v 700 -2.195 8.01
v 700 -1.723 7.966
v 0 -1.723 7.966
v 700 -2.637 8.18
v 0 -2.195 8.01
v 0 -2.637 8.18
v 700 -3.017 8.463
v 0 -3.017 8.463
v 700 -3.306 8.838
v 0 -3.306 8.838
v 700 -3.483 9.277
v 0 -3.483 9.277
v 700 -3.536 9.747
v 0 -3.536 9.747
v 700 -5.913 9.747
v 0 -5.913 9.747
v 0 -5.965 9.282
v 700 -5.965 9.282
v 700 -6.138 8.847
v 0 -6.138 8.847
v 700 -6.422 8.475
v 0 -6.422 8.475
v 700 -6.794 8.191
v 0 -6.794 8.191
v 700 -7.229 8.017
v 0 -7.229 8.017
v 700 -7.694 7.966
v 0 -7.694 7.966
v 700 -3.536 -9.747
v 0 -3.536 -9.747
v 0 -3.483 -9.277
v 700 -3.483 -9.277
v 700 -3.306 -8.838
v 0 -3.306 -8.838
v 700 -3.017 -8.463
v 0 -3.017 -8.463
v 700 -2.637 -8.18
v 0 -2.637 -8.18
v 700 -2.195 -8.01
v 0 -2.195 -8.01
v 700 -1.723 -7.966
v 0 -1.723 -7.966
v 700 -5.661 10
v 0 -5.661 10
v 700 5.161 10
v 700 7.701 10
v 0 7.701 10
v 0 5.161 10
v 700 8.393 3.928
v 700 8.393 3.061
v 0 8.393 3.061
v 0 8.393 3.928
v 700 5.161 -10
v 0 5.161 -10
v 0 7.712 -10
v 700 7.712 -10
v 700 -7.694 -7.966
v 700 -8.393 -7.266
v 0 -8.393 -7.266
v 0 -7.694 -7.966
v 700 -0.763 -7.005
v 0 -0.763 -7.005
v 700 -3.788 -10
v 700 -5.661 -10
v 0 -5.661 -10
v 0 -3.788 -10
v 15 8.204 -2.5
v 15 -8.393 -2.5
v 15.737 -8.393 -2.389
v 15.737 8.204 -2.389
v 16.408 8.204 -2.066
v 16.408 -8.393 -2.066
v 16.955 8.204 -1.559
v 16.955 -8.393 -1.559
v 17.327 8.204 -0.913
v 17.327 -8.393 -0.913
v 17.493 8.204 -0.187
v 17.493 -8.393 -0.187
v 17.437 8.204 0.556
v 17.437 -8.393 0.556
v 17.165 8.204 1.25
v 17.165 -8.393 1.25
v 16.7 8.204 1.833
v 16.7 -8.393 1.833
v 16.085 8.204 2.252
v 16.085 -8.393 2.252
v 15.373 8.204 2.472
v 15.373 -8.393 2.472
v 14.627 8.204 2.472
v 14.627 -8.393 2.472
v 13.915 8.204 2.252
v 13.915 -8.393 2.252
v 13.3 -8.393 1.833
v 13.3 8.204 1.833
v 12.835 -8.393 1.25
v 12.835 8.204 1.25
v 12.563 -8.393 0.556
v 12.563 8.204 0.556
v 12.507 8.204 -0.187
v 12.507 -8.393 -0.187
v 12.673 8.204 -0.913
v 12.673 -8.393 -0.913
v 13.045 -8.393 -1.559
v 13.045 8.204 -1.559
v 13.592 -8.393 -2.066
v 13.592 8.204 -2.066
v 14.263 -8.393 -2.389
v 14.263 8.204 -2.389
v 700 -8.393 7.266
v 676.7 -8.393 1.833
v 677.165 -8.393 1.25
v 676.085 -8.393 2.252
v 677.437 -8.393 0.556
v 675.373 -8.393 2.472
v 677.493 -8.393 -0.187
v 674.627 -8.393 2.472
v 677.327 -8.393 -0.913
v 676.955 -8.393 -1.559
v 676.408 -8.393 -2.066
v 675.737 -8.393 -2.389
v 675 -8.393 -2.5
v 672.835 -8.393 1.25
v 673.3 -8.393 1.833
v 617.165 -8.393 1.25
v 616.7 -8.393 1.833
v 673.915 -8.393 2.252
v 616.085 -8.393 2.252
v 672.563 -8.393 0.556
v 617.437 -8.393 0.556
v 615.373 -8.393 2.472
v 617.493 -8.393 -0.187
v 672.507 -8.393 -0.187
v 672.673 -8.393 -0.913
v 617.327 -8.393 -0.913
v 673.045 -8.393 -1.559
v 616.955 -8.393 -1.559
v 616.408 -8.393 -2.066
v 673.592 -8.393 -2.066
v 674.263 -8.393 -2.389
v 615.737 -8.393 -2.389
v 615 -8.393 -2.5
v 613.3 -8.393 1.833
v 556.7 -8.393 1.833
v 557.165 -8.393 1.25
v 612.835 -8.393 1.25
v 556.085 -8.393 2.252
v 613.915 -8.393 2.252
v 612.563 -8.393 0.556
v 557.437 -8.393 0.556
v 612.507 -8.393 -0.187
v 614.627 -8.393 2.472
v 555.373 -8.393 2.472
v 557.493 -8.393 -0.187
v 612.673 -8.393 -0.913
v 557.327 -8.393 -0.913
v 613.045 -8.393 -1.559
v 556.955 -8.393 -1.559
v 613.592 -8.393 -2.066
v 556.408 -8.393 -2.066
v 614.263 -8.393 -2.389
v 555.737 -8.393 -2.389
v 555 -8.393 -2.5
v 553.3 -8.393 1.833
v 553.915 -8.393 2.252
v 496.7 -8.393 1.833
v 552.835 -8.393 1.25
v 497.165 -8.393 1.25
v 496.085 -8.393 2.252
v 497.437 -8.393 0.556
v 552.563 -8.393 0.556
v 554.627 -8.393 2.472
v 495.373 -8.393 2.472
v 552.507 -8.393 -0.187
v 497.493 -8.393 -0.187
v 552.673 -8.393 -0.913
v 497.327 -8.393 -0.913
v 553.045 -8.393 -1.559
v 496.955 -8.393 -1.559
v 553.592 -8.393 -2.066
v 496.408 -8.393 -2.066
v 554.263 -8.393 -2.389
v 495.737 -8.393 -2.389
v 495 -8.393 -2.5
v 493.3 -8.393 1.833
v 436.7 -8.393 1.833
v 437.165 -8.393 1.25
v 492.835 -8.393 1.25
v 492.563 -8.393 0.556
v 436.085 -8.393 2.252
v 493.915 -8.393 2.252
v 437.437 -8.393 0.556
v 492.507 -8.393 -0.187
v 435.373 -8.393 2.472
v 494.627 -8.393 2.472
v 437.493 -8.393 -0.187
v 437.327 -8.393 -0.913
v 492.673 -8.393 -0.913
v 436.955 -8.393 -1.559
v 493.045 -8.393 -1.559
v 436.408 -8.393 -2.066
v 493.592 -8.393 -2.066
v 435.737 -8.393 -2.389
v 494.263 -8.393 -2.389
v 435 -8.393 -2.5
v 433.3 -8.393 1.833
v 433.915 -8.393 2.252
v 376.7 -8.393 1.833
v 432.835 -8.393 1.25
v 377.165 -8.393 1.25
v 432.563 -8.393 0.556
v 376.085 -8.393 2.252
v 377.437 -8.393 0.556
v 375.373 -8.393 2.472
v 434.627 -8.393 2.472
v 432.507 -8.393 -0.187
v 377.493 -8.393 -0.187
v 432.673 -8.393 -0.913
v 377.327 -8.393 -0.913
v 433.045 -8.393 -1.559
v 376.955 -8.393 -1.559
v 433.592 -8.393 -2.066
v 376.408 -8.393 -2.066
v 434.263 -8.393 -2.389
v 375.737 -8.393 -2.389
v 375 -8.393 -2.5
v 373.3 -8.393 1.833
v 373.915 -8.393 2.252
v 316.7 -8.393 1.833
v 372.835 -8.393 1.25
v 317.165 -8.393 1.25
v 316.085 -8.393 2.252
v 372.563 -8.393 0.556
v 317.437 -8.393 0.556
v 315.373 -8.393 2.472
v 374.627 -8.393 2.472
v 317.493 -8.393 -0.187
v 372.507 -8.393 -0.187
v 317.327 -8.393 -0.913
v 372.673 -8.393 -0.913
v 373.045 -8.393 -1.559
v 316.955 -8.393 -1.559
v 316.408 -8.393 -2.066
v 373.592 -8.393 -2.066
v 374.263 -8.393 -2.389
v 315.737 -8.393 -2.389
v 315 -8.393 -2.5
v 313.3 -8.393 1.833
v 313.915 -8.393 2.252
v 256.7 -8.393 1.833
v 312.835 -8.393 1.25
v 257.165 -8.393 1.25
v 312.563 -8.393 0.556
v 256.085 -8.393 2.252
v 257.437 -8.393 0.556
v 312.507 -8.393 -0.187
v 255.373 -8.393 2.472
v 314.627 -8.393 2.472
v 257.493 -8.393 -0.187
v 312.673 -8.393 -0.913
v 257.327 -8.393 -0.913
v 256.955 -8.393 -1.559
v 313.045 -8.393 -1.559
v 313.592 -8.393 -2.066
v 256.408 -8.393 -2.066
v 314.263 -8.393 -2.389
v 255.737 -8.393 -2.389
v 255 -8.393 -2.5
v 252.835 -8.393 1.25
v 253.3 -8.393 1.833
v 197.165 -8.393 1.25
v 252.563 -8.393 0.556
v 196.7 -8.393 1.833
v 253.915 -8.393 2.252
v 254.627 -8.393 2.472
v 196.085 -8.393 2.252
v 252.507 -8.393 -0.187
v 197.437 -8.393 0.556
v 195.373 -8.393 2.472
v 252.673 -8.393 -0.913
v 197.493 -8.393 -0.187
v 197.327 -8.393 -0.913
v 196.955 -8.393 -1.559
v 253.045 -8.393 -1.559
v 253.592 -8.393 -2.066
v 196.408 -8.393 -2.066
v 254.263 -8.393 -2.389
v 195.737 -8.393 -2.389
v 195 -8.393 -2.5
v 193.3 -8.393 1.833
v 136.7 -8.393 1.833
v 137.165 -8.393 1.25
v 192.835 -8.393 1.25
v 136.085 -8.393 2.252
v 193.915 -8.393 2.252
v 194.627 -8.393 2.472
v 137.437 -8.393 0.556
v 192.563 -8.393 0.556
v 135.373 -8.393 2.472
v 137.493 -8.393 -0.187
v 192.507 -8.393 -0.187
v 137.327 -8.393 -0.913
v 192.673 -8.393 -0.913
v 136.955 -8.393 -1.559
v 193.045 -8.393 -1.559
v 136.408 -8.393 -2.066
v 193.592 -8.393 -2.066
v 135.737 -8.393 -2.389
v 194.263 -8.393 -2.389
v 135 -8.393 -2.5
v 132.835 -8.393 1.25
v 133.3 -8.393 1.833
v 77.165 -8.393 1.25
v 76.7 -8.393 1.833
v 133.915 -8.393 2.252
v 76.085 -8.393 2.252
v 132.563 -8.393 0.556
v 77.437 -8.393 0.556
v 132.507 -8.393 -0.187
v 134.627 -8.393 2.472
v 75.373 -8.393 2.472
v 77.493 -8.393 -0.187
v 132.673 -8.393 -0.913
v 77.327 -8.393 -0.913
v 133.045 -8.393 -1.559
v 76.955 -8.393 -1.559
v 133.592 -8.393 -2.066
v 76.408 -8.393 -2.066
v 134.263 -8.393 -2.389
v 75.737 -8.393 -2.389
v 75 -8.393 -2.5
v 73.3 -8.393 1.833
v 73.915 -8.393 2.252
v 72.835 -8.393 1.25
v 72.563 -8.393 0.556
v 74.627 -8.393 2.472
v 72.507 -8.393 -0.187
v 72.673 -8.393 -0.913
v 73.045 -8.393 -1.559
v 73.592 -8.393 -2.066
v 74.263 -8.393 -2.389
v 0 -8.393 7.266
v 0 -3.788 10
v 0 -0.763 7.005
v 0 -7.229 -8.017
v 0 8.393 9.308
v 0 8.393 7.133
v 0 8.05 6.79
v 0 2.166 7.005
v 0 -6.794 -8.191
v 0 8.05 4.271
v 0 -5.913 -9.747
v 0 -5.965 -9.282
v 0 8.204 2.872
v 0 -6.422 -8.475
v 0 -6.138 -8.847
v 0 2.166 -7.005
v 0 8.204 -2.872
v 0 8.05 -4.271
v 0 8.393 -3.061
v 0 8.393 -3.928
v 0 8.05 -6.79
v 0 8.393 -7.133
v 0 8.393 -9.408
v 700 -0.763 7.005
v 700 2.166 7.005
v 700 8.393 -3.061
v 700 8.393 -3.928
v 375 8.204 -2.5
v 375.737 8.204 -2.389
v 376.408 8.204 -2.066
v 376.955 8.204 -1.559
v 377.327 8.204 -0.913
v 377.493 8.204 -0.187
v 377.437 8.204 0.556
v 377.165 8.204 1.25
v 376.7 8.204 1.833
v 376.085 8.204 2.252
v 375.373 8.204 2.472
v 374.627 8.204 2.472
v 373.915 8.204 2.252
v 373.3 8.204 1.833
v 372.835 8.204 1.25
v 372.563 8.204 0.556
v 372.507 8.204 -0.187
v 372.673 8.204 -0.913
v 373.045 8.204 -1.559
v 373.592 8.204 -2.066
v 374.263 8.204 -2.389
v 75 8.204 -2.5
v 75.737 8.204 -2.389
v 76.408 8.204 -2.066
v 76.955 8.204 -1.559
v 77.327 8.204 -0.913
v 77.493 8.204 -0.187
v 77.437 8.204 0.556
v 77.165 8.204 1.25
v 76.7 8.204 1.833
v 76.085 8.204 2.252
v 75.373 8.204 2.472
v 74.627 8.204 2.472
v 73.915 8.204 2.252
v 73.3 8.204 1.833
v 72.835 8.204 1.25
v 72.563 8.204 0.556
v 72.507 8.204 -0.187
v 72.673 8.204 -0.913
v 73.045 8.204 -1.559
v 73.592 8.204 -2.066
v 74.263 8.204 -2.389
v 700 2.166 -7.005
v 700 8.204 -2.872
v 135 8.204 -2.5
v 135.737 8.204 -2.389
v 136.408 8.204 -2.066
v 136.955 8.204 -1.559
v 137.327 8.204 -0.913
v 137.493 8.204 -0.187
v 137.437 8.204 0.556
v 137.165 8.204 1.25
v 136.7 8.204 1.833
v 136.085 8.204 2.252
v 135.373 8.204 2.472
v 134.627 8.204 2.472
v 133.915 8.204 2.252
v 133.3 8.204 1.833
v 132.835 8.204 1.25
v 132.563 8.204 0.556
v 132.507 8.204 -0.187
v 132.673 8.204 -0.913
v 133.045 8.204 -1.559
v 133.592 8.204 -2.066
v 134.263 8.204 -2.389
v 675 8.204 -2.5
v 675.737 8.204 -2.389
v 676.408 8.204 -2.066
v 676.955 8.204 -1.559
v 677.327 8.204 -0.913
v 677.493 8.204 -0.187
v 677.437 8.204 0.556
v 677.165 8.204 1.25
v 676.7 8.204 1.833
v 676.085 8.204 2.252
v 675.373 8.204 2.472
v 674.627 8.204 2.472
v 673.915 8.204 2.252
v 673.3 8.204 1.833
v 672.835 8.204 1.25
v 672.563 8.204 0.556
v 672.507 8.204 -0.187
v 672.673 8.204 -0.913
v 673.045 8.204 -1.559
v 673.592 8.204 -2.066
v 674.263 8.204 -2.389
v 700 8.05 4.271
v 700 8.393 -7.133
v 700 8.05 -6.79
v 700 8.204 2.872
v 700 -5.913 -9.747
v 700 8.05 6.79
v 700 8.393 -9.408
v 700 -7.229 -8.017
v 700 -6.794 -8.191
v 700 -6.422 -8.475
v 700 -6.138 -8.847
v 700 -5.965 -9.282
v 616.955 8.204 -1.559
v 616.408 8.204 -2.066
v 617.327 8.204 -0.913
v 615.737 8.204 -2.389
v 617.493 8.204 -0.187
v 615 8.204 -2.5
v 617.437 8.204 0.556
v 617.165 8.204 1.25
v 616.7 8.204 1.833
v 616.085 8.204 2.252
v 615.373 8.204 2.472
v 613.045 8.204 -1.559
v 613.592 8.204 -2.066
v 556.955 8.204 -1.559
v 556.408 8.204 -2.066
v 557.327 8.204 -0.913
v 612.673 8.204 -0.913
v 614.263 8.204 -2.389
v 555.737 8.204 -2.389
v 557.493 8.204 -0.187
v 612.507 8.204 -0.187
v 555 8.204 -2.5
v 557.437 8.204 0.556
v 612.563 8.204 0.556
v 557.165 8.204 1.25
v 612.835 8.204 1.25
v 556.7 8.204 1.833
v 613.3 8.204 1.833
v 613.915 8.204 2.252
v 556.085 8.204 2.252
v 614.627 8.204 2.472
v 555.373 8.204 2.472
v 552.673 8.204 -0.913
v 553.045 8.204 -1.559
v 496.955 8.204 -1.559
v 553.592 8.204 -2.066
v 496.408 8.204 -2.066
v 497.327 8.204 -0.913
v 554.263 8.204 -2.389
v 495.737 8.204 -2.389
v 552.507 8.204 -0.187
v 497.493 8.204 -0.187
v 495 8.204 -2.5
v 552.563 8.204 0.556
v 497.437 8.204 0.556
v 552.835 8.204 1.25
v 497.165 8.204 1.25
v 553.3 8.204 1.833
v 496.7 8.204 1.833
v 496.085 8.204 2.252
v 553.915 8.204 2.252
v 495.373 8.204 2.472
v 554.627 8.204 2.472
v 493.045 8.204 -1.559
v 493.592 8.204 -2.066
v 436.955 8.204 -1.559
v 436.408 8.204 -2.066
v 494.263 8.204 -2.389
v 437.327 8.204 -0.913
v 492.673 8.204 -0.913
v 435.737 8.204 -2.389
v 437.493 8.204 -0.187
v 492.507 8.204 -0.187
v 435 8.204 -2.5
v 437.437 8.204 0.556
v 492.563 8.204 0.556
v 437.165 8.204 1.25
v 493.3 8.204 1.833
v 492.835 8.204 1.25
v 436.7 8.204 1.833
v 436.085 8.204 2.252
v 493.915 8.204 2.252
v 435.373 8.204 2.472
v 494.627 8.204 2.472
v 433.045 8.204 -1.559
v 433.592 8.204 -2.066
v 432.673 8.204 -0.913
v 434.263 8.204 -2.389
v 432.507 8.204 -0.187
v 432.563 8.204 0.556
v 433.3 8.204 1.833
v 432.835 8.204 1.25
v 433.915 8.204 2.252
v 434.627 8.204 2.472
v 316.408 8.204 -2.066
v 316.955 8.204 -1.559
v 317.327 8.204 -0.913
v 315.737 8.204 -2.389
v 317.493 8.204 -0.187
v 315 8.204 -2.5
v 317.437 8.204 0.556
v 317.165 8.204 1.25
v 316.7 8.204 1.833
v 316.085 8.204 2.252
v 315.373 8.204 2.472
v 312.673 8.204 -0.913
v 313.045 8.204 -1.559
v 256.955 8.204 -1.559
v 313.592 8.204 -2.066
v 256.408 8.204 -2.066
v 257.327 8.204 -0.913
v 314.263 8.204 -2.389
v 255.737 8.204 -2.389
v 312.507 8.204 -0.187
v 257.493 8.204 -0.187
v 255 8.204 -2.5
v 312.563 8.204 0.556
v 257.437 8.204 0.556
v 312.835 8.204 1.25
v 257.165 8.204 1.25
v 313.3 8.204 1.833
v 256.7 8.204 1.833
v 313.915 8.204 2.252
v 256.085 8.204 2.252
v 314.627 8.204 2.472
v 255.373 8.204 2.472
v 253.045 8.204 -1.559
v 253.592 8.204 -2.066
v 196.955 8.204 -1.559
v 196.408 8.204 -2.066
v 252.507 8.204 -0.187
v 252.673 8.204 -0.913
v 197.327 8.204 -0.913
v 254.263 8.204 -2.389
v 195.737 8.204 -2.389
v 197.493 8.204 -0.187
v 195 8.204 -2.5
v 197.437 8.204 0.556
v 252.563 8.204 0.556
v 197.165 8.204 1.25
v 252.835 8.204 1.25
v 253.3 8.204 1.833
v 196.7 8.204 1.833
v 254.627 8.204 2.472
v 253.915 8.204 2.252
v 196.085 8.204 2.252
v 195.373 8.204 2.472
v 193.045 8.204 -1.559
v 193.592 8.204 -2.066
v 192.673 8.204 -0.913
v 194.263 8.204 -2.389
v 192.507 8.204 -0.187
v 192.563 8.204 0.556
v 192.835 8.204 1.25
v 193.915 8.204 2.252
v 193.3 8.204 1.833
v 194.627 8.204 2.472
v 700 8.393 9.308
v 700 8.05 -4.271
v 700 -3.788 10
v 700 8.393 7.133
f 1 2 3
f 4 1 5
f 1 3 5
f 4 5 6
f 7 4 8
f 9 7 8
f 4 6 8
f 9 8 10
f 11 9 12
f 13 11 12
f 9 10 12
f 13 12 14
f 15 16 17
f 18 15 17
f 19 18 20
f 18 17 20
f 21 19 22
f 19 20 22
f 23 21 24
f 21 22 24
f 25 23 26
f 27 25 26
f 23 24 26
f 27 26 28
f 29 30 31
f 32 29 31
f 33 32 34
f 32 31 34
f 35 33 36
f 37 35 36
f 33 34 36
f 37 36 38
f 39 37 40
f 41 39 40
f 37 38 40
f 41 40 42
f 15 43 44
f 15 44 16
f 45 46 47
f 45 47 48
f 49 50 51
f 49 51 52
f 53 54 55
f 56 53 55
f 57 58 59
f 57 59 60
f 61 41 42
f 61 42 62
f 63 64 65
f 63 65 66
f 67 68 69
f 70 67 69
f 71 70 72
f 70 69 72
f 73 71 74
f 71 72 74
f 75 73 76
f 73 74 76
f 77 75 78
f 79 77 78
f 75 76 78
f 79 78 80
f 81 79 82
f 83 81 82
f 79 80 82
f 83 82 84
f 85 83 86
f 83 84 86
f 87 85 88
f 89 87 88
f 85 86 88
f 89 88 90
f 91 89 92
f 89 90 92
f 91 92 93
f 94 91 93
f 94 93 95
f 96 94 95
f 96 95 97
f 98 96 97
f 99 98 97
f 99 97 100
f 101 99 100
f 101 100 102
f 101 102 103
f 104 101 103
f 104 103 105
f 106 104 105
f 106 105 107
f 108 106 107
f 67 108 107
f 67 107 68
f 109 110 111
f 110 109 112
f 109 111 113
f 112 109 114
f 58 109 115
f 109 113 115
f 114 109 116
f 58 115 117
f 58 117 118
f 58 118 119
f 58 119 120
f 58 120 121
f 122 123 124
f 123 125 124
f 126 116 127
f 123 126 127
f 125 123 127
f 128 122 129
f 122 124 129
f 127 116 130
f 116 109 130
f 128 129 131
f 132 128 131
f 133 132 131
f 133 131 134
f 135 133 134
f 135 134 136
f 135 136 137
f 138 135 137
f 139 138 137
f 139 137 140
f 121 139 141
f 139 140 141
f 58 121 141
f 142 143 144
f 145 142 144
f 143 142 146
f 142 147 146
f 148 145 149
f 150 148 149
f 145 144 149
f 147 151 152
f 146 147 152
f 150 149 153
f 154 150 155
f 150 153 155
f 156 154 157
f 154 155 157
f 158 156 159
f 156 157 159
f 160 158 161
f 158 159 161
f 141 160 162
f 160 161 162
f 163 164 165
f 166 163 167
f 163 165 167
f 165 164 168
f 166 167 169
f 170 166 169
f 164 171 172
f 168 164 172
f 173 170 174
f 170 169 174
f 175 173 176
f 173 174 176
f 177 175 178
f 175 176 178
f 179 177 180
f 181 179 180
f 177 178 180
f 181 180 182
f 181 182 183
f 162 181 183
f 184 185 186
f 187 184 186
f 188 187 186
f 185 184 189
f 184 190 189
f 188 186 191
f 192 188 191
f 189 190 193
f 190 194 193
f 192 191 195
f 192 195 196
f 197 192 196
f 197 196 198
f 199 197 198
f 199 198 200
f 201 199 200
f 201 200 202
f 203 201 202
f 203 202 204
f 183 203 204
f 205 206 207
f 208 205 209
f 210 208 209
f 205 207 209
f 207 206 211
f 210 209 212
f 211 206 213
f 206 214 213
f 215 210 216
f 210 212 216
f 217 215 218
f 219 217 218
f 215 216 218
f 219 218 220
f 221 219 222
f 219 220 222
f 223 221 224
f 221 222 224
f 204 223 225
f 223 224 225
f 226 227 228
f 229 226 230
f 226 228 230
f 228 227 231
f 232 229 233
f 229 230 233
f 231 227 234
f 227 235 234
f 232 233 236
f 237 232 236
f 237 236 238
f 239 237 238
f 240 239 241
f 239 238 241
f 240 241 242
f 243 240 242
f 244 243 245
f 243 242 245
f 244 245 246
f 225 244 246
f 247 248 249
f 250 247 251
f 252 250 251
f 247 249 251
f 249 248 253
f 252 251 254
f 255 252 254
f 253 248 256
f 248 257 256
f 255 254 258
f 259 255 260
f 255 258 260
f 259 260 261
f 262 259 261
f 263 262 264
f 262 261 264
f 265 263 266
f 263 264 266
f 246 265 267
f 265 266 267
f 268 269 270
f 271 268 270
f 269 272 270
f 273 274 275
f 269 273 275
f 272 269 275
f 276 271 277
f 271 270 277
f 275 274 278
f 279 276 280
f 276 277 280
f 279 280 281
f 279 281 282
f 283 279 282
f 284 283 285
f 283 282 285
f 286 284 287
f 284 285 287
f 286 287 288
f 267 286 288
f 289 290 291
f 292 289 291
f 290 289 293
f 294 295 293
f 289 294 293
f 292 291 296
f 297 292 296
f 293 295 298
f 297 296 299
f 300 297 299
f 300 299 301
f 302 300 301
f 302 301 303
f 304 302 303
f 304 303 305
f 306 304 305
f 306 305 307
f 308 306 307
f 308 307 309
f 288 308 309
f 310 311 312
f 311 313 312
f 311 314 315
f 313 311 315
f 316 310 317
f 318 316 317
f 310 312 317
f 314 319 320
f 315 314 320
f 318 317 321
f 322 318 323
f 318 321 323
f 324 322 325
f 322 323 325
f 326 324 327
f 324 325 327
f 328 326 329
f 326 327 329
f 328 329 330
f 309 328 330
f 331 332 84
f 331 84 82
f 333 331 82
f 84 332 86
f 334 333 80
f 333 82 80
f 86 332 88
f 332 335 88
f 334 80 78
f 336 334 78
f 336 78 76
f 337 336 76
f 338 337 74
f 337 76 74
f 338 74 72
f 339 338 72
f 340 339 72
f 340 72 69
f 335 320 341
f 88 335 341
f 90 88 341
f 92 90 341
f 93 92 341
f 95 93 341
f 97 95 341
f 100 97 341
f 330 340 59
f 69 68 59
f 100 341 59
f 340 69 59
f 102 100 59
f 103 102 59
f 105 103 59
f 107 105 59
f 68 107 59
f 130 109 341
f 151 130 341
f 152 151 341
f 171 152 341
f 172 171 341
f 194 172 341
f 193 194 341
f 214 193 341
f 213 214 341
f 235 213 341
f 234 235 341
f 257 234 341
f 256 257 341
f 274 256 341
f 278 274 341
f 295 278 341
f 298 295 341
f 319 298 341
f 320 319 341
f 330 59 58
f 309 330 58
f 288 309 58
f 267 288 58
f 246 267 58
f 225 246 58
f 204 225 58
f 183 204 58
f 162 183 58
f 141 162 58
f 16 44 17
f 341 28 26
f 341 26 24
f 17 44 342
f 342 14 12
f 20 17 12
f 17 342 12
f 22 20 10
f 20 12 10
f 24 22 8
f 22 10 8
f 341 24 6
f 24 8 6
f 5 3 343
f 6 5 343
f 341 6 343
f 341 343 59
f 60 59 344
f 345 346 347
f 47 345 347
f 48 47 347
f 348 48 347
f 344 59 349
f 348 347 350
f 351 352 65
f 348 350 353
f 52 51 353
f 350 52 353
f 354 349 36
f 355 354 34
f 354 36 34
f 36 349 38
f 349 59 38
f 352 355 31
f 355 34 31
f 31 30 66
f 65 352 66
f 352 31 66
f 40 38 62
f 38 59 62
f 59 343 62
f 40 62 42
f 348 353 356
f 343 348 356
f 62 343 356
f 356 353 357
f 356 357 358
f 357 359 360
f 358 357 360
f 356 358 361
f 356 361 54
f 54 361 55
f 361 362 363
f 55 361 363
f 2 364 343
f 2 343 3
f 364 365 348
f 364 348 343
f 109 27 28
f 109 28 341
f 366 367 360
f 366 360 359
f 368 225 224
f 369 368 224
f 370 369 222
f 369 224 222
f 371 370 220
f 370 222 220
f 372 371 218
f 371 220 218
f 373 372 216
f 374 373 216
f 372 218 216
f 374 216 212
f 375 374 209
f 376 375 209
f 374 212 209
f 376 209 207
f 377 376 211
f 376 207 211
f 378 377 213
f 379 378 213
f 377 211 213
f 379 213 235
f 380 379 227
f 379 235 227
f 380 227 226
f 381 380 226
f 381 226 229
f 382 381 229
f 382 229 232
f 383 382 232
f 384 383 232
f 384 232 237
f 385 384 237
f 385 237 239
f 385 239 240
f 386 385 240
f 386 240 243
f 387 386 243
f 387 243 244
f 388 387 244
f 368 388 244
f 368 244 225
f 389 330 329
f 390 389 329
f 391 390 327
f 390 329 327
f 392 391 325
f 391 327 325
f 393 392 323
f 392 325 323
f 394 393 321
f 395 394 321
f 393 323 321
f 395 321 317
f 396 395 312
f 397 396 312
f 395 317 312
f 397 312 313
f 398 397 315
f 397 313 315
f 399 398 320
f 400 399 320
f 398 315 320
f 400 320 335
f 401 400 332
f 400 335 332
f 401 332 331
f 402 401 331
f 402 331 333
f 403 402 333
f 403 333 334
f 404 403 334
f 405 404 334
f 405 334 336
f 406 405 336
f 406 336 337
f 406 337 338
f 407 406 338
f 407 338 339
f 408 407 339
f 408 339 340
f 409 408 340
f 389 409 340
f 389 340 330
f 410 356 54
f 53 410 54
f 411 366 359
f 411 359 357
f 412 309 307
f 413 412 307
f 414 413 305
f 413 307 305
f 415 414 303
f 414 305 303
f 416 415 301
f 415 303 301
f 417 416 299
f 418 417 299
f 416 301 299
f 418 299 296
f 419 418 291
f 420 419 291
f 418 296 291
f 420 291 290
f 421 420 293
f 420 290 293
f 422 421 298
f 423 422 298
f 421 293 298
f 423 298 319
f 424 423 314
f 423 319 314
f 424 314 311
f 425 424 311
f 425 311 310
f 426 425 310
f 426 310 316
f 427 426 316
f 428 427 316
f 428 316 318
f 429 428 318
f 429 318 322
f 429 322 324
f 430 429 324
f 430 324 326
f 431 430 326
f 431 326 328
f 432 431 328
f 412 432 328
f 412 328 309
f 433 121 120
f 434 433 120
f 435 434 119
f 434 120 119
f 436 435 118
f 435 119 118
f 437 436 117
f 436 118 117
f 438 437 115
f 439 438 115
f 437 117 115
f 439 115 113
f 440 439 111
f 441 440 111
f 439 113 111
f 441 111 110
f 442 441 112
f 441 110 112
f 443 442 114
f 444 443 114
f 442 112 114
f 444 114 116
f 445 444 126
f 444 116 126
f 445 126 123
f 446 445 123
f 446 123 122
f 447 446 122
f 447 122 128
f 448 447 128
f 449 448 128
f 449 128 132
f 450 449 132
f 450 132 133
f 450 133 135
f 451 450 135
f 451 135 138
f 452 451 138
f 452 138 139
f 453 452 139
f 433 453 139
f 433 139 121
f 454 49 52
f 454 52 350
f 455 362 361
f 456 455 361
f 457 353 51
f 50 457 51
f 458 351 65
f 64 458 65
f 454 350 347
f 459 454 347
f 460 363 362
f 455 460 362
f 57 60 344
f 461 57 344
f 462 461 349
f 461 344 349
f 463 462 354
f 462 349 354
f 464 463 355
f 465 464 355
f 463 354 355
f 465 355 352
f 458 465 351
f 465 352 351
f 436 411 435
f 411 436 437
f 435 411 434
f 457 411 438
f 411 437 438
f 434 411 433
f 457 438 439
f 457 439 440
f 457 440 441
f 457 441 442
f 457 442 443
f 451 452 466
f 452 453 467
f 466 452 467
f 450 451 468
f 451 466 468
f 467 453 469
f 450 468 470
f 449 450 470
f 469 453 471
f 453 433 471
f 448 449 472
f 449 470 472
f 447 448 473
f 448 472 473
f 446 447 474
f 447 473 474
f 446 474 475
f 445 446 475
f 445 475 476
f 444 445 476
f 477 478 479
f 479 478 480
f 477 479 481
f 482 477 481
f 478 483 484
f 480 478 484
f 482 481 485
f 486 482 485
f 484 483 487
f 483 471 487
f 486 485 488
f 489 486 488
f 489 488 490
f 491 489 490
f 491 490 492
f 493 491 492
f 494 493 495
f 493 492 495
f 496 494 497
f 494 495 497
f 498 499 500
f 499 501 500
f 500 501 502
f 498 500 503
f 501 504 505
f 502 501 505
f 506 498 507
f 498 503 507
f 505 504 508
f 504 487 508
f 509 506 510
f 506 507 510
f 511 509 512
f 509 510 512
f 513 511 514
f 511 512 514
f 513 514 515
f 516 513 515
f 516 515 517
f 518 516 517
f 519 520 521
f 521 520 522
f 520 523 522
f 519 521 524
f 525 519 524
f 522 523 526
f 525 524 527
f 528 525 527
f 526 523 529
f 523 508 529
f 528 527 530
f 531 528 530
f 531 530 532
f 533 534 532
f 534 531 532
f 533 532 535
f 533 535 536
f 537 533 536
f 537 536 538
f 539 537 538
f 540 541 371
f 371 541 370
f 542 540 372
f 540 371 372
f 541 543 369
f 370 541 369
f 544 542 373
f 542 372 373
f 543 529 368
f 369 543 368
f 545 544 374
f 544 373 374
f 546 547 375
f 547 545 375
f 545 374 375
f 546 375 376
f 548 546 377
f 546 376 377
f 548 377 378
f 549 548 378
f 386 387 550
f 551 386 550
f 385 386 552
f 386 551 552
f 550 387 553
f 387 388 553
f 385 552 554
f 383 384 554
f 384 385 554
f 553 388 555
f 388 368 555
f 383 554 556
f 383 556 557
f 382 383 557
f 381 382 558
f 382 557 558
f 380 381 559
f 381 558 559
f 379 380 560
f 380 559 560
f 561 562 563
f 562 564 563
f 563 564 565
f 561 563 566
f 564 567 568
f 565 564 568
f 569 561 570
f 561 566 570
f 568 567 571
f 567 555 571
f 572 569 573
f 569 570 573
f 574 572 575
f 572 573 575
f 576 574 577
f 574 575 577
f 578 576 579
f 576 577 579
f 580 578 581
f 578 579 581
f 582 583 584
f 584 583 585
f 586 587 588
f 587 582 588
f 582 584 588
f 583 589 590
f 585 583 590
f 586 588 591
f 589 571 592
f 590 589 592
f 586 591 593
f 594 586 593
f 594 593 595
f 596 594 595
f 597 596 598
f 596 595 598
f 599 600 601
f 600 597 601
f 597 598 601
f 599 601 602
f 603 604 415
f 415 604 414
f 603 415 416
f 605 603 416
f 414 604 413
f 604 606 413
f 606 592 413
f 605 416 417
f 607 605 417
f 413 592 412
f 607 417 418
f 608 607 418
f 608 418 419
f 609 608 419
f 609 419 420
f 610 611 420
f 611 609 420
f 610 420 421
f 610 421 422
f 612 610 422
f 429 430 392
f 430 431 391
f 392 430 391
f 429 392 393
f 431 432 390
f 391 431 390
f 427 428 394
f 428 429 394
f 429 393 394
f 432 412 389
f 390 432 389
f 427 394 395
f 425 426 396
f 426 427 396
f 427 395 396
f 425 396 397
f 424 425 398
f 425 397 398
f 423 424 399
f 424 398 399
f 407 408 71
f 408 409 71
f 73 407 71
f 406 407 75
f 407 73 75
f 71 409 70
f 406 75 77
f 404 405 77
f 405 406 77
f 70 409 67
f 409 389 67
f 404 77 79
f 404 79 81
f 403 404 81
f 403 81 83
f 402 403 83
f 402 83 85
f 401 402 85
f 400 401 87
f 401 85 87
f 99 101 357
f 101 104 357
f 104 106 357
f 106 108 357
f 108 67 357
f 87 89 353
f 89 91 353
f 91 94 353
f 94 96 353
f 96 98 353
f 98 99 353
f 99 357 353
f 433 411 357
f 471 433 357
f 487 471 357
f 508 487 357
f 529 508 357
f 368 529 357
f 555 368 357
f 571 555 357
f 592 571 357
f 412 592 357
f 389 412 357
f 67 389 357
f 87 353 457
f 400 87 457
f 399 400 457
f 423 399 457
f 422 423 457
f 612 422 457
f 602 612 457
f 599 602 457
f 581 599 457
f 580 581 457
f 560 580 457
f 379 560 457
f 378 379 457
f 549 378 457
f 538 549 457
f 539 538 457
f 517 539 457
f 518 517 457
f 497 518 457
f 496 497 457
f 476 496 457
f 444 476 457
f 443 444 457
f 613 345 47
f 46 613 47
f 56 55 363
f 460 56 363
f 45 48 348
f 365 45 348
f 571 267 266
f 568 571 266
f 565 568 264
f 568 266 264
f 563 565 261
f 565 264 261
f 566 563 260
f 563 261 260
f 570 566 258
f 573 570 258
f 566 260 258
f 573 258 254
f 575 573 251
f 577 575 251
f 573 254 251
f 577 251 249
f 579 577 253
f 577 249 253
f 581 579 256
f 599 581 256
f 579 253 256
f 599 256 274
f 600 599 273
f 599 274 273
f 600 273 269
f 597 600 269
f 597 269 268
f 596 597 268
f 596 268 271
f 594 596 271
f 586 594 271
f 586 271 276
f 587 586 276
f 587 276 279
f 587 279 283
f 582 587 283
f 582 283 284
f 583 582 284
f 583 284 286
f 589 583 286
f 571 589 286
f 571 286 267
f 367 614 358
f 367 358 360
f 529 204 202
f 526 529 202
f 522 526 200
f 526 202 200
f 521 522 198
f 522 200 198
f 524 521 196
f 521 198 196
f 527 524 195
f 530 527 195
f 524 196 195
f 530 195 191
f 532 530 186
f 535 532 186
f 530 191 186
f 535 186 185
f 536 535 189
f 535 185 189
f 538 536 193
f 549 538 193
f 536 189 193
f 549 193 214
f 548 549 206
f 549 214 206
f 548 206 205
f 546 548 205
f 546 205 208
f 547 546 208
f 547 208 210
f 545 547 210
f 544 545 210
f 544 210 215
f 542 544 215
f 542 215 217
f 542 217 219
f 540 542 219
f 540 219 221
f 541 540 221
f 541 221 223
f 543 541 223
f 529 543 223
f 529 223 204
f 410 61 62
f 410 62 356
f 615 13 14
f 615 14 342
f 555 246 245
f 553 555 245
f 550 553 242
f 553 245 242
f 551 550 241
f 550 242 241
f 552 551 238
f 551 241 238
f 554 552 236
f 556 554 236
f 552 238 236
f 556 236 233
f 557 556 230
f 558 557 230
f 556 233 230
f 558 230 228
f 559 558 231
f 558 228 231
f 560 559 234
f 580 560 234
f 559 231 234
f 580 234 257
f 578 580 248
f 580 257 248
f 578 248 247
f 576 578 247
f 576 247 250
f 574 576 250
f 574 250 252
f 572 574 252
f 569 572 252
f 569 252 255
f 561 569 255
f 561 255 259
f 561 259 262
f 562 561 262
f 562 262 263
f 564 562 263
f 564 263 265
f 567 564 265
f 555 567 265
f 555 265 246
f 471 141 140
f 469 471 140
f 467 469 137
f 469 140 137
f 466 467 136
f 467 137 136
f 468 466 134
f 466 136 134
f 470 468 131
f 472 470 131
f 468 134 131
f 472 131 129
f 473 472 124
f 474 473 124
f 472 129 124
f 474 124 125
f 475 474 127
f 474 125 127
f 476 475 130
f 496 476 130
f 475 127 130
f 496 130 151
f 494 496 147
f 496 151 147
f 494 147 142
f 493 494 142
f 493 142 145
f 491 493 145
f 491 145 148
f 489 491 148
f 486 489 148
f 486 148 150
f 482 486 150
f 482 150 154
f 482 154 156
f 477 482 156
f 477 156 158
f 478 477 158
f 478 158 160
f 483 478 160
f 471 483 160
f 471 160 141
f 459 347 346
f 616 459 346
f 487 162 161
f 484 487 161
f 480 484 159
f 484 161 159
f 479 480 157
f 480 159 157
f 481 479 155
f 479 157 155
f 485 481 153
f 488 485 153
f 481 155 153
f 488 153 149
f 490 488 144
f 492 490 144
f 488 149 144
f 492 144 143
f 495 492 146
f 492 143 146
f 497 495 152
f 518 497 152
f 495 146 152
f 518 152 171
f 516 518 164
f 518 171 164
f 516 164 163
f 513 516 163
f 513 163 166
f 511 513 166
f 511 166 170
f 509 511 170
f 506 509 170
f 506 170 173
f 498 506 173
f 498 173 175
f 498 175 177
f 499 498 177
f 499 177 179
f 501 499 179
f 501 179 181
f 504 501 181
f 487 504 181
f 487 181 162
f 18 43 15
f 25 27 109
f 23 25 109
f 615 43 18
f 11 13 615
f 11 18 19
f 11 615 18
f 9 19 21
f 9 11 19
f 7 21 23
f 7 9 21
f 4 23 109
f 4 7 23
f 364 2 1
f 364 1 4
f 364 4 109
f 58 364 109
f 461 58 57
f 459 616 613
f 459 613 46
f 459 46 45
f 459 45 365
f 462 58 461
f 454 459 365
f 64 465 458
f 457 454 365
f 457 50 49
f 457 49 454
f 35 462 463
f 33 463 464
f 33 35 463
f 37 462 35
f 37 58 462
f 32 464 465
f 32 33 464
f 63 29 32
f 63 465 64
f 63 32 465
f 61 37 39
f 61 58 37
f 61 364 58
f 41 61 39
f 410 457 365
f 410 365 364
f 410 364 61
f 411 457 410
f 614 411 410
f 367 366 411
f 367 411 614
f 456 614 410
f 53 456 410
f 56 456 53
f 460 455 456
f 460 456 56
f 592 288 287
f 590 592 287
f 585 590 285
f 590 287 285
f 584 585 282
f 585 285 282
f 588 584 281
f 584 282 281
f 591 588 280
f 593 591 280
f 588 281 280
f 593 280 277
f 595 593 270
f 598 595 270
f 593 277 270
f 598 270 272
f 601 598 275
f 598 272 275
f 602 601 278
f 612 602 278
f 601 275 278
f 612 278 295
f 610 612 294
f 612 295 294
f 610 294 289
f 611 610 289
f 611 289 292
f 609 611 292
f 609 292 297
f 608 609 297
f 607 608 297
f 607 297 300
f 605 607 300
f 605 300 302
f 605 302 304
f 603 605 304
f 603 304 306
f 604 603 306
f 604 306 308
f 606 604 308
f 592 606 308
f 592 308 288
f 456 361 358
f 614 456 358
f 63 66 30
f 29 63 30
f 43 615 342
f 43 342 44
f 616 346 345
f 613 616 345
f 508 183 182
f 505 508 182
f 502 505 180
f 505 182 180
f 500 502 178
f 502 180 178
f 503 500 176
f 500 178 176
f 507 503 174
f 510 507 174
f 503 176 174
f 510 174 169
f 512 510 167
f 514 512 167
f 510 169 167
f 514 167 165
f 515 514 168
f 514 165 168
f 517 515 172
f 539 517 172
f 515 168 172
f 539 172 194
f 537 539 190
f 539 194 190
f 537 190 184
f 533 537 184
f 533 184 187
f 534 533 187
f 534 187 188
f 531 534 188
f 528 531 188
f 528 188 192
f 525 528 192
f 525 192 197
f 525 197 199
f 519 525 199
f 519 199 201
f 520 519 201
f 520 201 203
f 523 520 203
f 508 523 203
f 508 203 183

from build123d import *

# Parameters (mm, degrees)
BOSS_EXTRUDE1_DEPTH   = 700
CROQUIS1_R            = 2.5
CORTAR_EXTRUIR1_DEPTH = 20
MATRIZL1_COUNT        = 12
MATRIZL1_PITCH        = 60


with BuildPart() as part:
    # Sketch1 → Boss-Extrude1 (new body)
    with BuildSketch(Plane(origin=(0, 0, 0), x_dir=(0, 0, -1), z_dir=(1, 0, 0))):
        with BuildLine():
            Line((-7.965754986, -7.693975449), (-7.266272068, -8.393458366))
            Line((-7.266272068, -8.393458366), (7.266272068, -8.393458366))
            Line((7.266272068, -8.393458366), (7.965754986, -7.693975449))
            ThreePointArc((7.965754986, -7.693975449), (8.474723757, -6.421557866), (9.747437917, -5.913331162))
            Line((9.747437917, -5.913331162), (10.000000437, -5.660768637))
            Line((10.000000437, -5.660768637), (10.000000437, -3.788406023))
            Line((10.000000437, -3.788406023), (9.747437912, -3.535843503))
            ThreePointArc((9.747437912, -3.535843503), (8.462742055, -3.016656911), (7.965755402, -1.72321096))
            Line((7.965755402, -1.72321096), (7.005148341, -0.762603918))
            Line((7.005148341, -0.762603918), (7.005148341, 2.166206023))
            Line((7.005148341, 2.166206023), (10.000000347, 5.161058089))
            Line((10.000000347, 5.161058089), (10.000000347, 7.712387211))
            Line((10.000000347, 7.712387211), (9.408464779, 8.393458268))
            Line((9.408464779, 8.393458268), (7.133016457, 8.393458268))
            Line((7.133016457, 8.393458268), (6.789534443, 8.049976247))
            Line((6.789534443, 8.049976247), (4.271139656, 8.049976247))
            Line((4.271139656, 8.049976247), (3.927707784, 8.393458265))
            Line((3.927707784, 8.393458265), (3.061282509, 8.393458265))
            Line((3.061282509, 8.393458265), (2.872049327, 8.204225079))
            Line((2.872049327, 8.204225079), (-2.87204886, 8.204225079))
            Line((-2.87204886, 8.204225079), (-3.061282046, 8.393458261))
            Line((-3.061282046, 8.393458261), (-3.927707321, 8.393458261))
            Line((-3.927707321, 8.393458261), (-4.271189216, 8.049976359))
            Line((-4.271189216, 8.049976359), (-6.789534095, 8.049976359))
            Line((-6.789534095, 8.049976359), (-7.133016116, 8.393458373))
            Line((-7.133016116, 8.393458373), (-9.30771733, 8.393458373))
            Line((-9.30771733, 8.393458373), (-10, 7.70117569))
            Line((-10, 7.70117569), (-10, 5.161058187))
            Line((-10, 5.161058187), (-7.005147934, 2.166206181))
            Line((-7.005147934, 2.166206181), (-7.005147934, -0.76260376))
            Line((-7.005147934, -0.76260376), (-7.965754986, -1.723210812))
            ThreePointArc((-7.965754986, -1.723210812), (-8.462741848, -3.016656549), (-9.747437477, -3.535843372))
            Line((-9.747437477, -3.535843372), (-10, -3.788405895))
            Line((-10, -3.788405895), (-10, -5.660768509))
            Line((-10, -5.660768509), (-9.747437477, -5.913331032))
            ThreePointArc((-9.747437477, -5.913331032), (-8.474723558, -6.421557943), (-7.965754986, -7.693975449))
        make_face()
    extrude(amount=BOSS_EXTRUDE1_DEPTH)

    # Croquis1 → Cortar-Extruir1 (cut)
    with BuildSketch(Plane.XZ.offset(8.393458366)):
        with Locations(Location((15, 0, 0), (0, 0, 270))):
            Circle(CROQUIS1_R)
    cortar_extruir1 = extrude(amount=-CORTAR_EXTRUIR1_DEPTH, mode=Mode.SUBTRACT)

    # MatrizL1: Cortar-Extruir1 ×12
    with Locations(*[(i * MATRIZL1_PITCH, 0, 0) for i in range(1, MATRIZL1_COUNT)]):
        add(cortar_extruir1, mode=Mode.SUBTRACT)


solid = part.part
